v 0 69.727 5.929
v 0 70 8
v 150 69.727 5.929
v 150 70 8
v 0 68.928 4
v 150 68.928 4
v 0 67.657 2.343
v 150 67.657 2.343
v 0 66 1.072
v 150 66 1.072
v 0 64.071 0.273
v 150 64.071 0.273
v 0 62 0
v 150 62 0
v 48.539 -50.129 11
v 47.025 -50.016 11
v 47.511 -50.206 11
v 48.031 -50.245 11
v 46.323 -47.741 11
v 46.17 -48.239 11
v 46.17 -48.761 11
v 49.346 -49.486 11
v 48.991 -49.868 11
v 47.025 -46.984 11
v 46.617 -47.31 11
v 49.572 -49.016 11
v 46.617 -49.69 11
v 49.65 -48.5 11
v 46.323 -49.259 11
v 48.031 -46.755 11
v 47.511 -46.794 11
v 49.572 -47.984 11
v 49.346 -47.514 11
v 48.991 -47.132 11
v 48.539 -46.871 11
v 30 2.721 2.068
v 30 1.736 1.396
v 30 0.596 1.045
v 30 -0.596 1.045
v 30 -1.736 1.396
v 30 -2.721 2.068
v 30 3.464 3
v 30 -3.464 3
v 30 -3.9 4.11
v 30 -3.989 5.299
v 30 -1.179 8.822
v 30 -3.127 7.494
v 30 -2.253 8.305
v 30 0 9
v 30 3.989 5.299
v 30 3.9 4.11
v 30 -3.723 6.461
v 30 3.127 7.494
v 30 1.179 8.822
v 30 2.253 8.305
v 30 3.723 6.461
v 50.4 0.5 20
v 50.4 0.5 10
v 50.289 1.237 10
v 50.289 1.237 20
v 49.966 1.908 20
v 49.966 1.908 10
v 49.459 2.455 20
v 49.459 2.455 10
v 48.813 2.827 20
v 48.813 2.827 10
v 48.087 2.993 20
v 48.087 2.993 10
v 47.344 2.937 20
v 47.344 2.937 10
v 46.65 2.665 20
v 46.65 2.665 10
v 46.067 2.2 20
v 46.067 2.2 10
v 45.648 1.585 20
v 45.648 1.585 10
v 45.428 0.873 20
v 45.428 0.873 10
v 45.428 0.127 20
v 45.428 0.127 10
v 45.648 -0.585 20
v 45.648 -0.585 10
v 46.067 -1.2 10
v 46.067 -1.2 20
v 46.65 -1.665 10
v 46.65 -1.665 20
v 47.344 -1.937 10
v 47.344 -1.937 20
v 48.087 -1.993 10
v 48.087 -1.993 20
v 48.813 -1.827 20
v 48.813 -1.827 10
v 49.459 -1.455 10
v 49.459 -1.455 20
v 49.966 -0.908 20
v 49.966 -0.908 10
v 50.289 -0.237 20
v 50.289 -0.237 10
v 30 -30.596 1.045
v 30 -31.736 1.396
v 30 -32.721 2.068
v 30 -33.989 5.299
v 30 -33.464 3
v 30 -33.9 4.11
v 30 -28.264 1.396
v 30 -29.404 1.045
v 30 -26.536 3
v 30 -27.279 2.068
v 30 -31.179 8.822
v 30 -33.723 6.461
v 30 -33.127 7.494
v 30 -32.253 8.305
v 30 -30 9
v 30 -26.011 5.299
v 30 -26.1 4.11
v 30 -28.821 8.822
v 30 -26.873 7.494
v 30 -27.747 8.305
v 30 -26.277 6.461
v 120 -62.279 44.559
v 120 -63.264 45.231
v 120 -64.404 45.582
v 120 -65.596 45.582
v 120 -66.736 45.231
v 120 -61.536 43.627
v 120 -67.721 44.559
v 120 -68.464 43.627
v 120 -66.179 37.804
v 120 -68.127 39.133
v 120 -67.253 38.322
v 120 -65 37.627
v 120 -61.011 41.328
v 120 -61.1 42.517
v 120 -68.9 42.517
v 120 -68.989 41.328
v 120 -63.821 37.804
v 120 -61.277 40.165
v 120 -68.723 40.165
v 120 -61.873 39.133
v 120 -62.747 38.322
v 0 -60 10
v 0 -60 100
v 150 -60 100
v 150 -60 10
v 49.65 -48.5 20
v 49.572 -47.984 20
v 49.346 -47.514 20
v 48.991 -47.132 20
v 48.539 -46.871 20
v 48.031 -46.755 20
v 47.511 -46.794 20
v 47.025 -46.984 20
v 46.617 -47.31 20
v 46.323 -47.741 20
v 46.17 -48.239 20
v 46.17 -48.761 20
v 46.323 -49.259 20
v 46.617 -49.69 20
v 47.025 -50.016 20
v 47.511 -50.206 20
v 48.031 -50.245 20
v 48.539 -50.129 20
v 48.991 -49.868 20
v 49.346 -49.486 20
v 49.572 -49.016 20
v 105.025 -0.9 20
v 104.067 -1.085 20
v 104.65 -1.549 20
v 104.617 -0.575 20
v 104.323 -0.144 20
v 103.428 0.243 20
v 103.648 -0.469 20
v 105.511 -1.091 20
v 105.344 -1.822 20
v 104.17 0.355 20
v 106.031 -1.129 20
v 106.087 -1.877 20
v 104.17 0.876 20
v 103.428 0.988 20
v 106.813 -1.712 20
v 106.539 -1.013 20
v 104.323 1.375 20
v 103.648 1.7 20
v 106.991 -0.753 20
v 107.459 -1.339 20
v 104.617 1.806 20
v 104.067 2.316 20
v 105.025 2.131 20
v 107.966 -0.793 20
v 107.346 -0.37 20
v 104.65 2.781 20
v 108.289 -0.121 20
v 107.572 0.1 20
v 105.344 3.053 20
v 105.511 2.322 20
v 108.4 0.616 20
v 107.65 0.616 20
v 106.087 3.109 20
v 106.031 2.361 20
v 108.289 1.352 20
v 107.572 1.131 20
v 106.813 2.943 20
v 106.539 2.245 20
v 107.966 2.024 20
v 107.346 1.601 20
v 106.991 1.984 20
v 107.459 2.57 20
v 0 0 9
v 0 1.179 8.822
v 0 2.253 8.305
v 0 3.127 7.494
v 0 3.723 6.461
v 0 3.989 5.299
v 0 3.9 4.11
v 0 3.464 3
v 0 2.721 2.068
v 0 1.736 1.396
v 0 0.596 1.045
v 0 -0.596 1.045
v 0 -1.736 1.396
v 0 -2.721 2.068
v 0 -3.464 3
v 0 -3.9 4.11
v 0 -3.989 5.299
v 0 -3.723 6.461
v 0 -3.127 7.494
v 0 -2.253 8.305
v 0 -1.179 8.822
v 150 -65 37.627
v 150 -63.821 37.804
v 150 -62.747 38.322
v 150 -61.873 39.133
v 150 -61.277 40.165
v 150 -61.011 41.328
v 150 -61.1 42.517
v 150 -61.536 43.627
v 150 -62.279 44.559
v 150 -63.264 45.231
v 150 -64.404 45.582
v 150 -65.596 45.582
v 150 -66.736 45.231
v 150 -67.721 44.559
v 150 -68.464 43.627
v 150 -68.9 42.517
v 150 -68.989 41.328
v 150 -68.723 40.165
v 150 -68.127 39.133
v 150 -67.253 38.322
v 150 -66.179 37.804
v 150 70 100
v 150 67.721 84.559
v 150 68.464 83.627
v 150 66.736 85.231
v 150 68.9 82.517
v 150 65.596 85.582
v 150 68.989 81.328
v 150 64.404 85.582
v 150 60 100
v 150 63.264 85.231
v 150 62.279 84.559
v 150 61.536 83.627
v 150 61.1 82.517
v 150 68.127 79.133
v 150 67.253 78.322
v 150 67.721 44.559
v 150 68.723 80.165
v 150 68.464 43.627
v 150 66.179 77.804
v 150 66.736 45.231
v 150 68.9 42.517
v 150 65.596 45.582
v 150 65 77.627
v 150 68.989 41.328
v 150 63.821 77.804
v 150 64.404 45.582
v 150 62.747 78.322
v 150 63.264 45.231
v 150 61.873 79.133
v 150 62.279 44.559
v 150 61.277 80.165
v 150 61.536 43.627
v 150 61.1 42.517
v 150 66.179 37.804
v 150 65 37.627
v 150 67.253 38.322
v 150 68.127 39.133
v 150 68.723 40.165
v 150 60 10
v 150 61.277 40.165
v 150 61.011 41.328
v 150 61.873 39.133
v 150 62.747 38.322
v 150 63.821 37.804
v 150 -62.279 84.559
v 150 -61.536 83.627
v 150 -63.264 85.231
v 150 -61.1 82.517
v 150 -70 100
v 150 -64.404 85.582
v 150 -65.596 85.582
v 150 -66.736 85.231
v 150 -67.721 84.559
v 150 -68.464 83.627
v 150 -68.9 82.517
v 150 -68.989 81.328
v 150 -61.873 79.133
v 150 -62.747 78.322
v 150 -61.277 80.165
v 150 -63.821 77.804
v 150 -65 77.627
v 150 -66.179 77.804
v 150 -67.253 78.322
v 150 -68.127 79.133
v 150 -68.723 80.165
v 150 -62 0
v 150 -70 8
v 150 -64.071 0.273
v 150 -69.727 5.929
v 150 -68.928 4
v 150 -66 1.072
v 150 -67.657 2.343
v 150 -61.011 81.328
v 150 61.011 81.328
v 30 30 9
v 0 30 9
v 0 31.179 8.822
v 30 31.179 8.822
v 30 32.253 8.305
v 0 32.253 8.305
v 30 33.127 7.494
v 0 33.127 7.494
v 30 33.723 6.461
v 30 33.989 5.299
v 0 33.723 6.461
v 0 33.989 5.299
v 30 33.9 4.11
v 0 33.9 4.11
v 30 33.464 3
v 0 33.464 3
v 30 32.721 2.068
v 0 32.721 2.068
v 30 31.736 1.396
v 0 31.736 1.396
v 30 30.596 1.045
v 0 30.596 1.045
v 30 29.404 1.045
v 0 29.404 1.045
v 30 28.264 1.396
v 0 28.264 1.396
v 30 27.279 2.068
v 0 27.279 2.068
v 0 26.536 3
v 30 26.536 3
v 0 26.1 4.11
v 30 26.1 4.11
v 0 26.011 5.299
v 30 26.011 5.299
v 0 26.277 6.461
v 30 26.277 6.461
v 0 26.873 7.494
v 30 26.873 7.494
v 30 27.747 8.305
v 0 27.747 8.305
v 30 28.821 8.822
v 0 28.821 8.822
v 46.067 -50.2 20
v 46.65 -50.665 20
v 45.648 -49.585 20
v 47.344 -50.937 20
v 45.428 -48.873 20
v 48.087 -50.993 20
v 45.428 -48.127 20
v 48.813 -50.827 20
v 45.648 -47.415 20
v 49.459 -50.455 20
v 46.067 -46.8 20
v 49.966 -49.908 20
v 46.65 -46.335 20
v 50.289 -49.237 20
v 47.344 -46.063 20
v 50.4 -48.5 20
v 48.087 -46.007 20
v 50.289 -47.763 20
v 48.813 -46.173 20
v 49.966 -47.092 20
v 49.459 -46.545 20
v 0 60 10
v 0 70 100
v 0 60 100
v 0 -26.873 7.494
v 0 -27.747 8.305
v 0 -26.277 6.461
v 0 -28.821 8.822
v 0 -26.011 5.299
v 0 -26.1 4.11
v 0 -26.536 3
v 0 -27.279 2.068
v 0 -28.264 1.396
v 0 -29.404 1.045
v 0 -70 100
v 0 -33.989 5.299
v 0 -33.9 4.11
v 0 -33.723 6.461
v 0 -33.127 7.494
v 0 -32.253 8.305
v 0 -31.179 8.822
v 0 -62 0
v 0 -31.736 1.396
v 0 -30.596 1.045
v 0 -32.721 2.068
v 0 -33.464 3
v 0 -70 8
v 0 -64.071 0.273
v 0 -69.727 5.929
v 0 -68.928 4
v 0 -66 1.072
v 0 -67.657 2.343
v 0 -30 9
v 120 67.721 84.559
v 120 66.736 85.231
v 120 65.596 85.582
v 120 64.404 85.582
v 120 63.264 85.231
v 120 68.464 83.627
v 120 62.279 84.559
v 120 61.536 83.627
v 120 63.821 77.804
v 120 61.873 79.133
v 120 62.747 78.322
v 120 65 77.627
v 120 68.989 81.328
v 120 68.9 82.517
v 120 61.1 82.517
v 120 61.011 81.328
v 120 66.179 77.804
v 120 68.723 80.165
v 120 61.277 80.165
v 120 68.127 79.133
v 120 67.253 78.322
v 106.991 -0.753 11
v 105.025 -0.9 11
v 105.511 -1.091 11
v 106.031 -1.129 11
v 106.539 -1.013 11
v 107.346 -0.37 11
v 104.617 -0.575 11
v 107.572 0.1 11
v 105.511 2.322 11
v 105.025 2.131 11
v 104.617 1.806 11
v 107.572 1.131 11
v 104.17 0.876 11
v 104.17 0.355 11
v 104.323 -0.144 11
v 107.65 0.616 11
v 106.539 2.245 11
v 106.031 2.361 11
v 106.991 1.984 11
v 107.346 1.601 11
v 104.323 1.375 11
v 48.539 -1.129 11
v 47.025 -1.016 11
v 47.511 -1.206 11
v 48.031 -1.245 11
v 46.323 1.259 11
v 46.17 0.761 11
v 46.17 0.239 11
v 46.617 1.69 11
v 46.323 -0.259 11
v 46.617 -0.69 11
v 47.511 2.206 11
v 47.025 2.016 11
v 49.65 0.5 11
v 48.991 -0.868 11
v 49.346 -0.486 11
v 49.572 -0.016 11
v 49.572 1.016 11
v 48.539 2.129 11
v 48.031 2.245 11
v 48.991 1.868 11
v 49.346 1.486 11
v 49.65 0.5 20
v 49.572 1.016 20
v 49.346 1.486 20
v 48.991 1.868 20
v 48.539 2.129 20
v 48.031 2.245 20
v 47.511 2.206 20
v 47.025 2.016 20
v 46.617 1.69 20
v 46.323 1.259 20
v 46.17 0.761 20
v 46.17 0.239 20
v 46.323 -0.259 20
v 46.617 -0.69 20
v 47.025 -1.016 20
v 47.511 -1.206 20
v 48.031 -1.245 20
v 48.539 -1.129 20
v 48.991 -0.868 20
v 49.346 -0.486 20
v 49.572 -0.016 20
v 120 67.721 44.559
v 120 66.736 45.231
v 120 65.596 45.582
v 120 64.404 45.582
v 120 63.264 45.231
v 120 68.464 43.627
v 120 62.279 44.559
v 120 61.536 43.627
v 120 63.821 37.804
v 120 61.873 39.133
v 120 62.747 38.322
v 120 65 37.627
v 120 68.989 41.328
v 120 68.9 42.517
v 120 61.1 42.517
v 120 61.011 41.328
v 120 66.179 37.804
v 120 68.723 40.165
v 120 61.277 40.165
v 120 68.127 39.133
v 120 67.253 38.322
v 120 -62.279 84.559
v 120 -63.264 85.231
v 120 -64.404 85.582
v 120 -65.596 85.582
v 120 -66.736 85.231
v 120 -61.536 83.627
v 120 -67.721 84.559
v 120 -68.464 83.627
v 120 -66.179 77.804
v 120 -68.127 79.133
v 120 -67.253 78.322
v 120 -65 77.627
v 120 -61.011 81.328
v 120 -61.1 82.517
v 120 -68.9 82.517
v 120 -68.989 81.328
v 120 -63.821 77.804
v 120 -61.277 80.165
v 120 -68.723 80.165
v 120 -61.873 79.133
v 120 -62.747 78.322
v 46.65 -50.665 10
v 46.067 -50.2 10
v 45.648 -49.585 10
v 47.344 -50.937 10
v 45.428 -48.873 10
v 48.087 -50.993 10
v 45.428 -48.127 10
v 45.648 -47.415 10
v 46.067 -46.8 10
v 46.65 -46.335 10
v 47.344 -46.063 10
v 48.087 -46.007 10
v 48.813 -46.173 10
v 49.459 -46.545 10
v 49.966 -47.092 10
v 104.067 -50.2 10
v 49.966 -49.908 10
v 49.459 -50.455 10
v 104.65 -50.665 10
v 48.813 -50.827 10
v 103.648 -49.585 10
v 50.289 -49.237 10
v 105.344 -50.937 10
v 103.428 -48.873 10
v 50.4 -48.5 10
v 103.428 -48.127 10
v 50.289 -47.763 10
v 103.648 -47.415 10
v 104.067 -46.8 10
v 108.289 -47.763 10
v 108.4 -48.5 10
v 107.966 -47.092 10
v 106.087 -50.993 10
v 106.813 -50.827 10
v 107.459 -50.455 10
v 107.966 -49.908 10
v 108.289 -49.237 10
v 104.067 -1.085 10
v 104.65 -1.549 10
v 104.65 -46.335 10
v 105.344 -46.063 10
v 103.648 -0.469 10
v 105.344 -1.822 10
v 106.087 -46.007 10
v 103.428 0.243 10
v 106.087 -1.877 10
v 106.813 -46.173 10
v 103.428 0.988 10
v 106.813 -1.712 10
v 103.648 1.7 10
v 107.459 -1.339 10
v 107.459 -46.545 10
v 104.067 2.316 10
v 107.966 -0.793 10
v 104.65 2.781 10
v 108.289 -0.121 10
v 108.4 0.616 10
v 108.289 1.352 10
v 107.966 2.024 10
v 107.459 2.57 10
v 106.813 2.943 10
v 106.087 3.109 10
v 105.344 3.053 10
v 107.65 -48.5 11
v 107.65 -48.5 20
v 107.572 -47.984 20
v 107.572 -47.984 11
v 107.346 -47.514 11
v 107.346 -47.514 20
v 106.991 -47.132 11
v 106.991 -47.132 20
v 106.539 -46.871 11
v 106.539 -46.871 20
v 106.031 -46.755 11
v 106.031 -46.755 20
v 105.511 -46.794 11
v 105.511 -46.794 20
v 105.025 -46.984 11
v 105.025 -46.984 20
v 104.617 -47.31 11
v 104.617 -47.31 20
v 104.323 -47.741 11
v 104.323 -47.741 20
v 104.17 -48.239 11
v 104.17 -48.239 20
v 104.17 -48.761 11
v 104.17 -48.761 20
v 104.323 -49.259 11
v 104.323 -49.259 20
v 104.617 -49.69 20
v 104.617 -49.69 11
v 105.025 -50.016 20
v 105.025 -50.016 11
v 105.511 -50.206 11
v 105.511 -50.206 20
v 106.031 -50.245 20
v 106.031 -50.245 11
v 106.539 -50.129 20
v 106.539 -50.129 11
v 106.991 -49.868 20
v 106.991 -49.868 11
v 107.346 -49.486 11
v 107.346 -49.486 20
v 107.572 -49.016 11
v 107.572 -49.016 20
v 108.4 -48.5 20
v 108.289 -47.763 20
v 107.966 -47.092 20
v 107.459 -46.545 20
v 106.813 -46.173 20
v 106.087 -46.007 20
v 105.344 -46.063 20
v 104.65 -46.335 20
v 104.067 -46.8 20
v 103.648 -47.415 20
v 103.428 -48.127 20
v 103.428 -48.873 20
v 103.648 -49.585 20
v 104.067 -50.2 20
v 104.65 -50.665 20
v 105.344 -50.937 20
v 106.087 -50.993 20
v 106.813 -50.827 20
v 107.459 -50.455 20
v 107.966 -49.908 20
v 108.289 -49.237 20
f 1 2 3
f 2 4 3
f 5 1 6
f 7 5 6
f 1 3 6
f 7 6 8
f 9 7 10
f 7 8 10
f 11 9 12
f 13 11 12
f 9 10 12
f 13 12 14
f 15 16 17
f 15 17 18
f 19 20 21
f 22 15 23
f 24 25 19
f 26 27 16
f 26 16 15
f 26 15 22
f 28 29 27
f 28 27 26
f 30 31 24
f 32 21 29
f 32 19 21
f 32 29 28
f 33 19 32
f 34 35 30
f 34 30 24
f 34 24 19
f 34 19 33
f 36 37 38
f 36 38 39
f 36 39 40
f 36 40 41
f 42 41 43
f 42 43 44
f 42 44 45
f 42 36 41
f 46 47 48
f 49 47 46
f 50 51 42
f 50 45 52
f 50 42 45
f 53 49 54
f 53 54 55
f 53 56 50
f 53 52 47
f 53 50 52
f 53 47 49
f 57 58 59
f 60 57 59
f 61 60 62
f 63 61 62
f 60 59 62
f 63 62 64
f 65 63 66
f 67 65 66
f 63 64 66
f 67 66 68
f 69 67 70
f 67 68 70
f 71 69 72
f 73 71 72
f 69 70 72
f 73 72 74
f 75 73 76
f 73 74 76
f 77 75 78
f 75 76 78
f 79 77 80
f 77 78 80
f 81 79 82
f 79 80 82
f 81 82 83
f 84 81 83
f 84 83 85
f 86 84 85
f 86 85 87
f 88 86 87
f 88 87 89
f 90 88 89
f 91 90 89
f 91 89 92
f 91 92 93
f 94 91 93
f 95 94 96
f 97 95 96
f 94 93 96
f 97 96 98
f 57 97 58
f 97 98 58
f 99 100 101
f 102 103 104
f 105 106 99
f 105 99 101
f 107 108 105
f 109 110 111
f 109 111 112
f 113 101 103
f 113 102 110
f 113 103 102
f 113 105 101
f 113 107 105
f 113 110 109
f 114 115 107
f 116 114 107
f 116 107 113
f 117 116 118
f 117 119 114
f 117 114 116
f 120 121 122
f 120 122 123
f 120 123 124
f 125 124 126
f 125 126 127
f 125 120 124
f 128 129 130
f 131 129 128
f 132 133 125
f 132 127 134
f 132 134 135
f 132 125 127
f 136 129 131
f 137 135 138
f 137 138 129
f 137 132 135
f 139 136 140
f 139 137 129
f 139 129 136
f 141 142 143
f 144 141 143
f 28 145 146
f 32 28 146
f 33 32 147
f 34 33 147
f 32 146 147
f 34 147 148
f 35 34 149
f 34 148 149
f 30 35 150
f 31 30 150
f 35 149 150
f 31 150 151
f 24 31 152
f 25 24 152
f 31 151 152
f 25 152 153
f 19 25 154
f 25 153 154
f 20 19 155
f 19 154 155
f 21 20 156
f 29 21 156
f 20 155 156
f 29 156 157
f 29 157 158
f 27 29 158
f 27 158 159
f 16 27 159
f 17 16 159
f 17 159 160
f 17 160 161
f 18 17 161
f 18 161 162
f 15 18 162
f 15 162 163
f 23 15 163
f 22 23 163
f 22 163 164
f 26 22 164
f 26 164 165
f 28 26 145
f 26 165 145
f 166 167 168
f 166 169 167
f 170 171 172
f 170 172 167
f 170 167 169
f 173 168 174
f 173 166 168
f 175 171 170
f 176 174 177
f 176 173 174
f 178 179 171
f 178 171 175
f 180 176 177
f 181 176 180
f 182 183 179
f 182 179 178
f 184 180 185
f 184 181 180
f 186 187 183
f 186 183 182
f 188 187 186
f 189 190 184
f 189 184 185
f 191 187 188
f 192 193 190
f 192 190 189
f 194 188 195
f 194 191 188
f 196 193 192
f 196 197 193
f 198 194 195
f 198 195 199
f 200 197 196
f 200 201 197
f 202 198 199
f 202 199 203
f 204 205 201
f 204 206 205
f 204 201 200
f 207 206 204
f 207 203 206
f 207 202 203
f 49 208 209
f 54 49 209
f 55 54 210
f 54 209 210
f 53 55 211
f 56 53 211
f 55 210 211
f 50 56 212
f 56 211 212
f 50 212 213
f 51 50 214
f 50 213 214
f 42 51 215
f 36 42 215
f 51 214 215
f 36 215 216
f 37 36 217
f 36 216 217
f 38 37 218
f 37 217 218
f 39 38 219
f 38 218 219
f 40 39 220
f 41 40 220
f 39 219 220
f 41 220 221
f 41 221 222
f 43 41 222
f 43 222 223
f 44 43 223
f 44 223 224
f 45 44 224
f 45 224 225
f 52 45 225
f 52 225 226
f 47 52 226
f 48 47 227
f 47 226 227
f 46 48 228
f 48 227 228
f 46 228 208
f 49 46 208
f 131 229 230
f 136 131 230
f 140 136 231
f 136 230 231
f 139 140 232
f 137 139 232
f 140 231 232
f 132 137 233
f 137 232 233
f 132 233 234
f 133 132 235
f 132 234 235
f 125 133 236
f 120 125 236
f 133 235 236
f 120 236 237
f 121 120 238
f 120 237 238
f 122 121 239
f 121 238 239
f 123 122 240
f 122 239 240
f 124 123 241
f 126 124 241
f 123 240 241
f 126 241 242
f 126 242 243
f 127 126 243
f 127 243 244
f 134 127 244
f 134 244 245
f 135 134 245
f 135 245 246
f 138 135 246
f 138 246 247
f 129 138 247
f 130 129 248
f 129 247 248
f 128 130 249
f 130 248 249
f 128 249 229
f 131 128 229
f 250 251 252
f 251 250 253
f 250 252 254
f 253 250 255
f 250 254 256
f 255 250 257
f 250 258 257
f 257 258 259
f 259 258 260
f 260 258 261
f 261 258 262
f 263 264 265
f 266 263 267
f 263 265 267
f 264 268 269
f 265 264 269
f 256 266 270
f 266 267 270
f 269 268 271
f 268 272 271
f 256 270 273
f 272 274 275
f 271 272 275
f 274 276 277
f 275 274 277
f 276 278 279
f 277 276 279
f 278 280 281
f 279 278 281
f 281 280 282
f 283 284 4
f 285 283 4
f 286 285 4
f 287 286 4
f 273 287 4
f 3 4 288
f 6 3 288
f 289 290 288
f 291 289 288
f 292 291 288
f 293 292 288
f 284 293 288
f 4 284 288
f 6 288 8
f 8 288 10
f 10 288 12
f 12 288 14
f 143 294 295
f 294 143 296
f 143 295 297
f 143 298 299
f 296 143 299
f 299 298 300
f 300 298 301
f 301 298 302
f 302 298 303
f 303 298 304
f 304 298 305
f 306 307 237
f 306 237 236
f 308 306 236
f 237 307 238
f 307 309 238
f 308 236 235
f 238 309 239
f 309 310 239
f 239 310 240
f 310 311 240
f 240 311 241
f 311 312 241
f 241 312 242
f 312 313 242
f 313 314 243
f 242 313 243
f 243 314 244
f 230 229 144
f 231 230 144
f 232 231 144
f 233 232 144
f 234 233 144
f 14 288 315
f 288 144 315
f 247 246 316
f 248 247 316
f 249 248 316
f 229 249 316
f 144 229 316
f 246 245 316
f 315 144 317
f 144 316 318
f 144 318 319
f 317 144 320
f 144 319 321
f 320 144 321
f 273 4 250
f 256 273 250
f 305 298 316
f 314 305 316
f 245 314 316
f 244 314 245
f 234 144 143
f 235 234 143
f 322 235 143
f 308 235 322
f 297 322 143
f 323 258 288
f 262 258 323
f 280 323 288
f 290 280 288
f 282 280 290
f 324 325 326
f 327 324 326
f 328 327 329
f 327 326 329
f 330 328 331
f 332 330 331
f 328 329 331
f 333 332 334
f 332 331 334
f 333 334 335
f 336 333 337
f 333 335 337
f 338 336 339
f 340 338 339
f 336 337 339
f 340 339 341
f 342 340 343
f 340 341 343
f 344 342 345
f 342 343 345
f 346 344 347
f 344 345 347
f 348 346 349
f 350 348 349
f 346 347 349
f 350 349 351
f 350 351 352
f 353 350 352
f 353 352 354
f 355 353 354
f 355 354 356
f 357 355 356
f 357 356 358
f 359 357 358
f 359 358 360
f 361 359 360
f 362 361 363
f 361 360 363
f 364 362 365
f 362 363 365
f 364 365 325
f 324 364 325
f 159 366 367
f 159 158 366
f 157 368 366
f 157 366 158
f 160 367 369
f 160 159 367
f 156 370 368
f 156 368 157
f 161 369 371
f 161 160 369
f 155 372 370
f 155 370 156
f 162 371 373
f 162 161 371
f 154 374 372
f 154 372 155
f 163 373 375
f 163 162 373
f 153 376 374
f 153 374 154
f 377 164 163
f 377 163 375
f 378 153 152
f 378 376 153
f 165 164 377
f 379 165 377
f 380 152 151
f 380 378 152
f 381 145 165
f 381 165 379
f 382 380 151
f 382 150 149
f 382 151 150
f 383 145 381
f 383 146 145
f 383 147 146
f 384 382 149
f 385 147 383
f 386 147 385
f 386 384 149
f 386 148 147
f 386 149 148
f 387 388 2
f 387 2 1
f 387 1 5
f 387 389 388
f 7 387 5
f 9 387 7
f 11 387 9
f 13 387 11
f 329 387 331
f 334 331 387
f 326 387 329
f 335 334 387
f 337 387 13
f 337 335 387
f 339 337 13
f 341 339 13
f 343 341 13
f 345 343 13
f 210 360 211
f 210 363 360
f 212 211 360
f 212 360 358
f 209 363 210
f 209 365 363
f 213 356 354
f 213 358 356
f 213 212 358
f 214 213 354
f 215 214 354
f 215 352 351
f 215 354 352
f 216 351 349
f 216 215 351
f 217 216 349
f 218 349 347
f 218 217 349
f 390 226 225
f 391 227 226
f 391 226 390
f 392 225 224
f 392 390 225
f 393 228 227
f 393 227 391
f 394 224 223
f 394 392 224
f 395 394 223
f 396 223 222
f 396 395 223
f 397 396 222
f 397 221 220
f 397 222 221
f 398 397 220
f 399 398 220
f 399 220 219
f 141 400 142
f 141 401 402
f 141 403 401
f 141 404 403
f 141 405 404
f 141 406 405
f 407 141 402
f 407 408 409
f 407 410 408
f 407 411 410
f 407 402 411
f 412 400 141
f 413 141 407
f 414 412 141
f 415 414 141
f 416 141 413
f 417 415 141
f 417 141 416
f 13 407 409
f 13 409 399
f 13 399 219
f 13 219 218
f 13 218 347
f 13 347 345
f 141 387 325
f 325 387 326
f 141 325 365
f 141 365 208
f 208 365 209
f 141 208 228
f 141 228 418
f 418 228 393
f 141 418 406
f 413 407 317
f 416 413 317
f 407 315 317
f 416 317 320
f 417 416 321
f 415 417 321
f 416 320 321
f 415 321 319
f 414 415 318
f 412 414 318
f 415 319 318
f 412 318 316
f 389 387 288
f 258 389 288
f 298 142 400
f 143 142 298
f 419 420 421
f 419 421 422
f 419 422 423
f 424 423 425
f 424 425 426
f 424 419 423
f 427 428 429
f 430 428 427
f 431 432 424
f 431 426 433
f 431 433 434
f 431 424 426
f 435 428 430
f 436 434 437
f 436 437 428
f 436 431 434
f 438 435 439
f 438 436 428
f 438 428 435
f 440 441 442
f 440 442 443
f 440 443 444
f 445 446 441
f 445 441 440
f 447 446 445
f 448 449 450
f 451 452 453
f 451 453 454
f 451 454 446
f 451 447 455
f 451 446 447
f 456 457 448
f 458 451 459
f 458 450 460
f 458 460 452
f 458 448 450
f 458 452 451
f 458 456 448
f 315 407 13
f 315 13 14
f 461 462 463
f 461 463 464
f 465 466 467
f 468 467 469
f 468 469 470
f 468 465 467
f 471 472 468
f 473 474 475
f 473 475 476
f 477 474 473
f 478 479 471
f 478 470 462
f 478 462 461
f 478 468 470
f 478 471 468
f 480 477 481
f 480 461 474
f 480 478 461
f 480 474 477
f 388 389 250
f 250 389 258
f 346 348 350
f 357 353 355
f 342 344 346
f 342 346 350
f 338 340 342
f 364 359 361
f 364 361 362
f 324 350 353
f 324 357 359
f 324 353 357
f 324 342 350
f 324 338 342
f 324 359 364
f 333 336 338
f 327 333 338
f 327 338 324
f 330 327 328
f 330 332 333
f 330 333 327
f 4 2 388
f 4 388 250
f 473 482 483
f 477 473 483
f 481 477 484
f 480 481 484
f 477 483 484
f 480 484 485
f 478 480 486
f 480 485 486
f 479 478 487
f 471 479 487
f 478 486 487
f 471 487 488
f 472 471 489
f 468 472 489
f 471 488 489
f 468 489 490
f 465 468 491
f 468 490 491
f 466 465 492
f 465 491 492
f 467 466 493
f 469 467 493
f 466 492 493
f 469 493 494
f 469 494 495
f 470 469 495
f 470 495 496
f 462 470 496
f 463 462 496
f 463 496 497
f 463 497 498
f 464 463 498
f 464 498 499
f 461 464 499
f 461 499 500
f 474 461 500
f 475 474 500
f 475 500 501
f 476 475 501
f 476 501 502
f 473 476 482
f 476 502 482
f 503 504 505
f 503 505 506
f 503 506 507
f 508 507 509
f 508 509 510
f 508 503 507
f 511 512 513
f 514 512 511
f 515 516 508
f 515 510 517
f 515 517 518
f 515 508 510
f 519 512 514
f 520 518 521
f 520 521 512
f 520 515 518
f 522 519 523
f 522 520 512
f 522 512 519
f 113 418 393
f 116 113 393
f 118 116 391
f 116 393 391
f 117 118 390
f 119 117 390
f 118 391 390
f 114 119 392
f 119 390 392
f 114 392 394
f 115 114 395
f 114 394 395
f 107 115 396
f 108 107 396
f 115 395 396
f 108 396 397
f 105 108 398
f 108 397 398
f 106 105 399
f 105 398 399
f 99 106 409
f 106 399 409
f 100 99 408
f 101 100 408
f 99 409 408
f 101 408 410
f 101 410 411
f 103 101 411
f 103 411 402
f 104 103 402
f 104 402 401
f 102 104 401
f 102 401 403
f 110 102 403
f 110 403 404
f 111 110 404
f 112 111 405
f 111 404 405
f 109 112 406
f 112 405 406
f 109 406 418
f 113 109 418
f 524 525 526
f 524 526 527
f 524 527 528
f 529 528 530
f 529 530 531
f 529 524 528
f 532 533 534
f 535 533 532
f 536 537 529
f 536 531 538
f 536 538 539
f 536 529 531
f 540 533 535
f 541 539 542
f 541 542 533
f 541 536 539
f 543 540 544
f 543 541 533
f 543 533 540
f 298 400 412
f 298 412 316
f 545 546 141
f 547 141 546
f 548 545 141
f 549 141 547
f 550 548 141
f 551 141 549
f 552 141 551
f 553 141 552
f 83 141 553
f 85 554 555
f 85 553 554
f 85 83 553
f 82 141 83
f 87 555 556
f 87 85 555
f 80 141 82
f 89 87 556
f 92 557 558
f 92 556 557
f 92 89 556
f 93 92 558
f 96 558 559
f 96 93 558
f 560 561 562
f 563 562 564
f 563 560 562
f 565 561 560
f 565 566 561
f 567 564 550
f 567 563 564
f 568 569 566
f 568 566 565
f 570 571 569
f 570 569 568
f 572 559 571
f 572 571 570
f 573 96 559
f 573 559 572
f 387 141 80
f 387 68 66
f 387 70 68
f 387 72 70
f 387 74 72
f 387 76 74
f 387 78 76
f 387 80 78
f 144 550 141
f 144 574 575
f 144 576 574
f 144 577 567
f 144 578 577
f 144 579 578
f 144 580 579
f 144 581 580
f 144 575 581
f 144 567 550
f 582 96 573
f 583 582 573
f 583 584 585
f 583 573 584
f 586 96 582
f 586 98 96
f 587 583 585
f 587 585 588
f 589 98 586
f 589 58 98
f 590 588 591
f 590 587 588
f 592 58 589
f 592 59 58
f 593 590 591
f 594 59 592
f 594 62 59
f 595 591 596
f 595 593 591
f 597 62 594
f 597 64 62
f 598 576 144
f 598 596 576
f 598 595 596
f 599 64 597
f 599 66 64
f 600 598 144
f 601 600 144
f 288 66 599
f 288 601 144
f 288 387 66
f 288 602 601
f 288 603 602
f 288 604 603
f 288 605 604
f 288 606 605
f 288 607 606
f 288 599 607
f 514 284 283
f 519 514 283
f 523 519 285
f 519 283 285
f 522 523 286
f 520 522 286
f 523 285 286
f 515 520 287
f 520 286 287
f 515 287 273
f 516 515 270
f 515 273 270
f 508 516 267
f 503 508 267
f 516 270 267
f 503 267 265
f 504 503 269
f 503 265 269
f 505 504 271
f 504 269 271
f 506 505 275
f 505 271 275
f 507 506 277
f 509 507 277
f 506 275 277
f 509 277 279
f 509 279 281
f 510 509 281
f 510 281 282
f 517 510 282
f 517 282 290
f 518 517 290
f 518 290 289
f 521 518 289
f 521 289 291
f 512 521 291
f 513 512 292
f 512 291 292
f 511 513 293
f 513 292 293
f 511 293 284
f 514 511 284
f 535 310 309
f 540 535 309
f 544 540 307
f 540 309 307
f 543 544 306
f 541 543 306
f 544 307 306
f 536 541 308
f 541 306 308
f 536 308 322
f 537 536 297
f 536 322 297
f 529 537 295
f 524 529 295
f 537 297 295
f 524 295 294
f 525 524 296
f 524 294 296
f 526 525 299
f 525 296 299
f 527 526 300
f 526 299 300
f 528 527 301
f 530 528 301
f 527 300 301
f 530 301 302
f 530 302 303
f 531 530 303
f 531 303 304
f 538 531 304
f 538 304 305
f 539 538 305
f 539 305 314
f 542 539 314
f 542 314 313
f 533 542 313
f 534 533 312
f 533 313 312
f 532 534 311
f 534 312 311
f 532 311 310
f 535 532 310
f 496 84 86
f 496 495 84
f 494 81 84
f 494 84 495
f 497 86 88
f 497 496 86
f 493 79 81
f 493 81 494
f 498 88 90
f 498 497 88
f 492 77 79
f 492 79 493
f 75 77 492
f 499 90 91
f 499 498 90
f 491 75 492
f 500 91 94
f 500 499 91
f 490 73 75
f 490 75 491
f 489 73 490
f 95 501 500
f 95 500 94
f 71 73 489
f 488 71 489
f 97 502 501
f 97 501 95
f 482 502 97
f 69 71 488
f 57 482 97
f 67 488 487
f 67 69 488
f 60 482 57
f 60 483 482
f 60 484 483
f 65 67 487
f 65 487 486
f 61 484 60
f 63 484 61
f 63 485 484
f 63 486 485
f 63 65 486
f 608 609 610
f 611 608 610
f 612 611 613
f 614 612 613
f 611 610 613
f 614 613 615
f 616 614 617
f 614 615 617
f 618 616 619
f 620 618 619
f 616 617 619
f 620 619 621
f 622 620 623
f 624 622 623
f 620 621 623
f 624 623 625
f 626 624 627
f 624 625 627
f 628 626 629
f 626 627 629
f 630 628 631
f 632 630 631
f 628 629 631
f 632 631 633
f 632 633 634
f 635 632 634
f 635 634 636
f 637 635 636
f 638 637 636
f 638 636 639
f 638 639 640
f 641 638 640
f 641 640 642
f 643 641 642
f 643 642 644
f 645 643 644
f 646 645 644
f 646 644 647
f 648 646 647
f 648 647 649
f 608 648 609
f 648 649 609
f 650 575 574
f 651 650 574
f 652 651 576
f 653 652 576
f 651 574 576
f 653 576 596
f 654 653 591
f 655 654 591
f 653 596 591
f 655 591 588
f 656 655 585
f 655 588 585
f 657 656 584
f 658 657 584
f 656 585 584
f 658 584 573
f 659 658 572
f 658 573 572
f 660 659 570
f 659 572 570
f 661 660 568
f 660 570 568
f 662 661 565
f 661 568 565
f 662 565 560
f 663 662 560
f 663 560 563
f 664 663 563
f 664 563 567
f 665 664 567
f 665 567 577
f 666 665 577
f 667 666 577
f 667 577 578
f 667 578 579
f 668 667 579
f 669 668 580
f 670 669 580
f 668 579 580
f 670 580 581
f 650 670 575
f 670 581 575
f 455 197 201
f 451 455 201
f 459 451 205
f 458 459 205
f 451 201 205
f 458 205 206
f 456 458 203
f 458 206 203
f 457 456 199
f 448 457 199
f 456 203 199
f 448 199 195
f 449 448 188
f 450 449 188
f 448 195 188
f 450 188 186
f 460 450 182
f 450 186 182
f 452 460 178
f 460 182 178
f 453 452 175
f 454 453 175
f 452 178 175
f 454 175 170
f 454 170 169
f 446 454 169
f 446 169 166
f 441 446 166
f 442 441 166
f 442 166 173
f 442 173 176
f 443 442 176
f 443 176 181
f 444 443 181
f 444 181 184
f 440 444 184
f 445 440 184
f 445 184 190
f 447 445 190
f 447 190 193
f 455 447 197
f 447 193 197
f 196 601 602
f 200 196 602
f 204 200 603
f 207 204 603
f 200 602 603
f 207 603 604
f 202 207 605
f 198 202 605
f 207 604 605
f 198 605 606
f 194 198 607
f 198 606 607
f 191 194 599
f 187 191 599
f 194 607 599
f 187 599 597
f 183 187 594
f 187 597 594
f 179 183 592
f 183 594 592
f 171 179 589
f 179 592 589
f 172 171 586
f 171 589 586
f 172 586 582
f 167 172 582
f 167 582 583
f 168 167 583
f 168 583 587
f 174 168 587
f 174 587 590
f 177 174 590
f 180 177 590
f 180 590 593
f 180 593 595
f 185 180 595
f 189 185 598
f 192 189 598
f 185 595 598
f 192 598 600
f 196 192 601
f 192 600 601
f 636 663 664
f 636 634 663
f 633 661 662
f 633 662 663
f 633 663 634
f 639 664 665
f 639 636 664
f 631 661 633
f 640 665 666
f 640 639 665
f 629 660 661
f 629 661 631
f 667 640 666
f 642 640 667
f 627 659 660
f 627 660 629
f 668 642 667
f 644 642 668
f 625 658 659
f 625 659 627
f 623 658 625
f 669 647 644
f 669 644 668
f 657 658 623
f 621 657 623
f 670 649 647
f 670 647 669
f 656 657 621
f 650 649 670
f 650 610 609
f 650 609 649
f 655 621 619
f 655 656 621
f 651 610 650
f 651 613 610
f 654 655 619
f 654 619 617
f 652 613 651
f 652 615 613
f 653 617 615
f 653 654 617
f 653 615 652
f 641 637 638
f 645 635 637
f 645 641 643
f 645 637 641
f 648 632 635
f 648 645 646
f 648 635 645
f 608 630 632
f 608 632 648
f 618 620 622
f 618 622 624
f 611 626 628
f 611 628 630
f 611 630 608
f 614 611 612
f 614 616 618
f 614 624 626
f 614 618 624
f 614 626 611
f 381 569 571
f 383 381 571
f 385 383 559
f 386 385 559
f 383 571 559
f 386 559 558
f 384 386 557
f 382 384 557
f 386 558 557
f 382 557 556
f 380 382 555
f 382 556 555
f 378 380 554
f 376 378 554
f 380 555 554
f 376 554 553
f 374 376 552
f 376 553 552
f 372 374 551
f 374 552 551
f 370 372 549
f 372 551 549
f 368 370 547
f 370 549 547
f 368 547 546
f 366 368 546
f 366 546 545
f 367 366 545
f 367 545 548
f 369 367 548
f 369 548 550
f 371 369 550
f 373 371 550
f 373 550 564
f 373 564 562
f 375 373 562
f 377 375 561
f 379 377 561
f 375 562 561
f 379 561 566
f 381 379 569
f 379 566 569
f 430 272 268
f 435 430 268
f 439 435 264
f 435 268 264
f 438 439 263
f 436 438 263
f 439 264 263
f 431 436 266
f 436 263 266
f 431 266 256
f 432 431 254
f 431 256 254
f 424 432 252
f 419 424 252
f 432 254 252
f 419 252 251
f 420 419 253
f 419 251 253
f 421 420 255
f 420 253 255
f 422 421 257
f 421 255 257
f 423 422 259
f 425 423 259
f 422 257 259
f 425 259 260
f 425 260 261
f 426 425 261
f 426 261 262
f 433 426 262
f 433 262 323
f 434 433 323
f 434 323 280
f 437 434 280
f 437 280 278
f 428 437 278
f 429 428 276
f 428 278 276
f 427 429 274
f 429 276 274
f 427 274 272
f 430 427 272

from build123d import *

# Parameters (mm, degrees)
SKETCH1_W               = 150
SKETCH1_H               = 120
BOSS_EXTRUDE1_DEPTH     = 10
SKETCH2_R               = 4
CUT_EXTRUDE1_DEPTH      = 30
CROQUIS4_R              = 2.5
SALIENTE_EXTRUIR2_DEPTH = 10
CROQUIS5_R              = 1.75
CORTAR_EXTRUIR1_DEPTH   = 9
CROQUIS6_W              = 150
CROQUIS6_H              = 100
SALIENTE_EXTRUIR3_DEPTH = 10
CROQUIS9_W              = 150
CROQUIS9_H              = 100
SALIENTE_EXTRUIR4_DEPTH = 10
CROQUIS10_R             = 4
CORTAR_EXTRUIR2_DEPTH   = 30
FILLET1_R               = 8


with BuildPart() as part:
    # Sketch1 → Boss-Extrude1 (new body)
    with BuildSketch(Plane.XY):
        with Locations((75, 0)):
            Rectangle(SKETCH1_W, SKETCH1_H)
    extrude(amount=BOSS_EXTRUDE1_DEPTH)

    # Sketch2 → Cut-Extrude1 (cut)
    with BuildSketch(Plane.ZY):
        with Locations((5, 0)):
            Circle(SKETCH2_R)
        with Locations((5, 30)):
            Circle(SKETCH2_R)
        with Locations((5, -30)):
            Circle(SKETCH2_R)
    extrude(amount=-CUT_EXTRUDE1_DEPTH, mode=Mode.SUBTRACT)

    # Croquis4 → Saliente-Extruir2 (add)
    with BuildSketch(Plane.XY.offset(10)):
        with Locations((47.900115216, 0.5)):
            Circle(CROQUIS4_R)
        with Locations((105.9, 0.615607451)):
            Circle(CROQUIS4_R)
        with Locations((105.9, -48.5)):
            Circle(CROQUIS4_R)
        with Locations((47.900115216, -48.5)):
            Circle(CROQUIS4_R)
    extrude(amount=SALIENTE_EXTRUIR2_DEPTH)

    # Croquis5 → Cortar-Extruir1 (cut)
    with BuildSketch(Plane.XY.offset(20)):
        with Locations((47.900115216, 0.5)):
            Circle(CROQUIS5_R)
        with Locations((47.900115216, -48.5)):
            Circle(CROQUIS5_R)
        with Locations((105.9, -48.5)):
            Circle(CROQUIS5_R)
        with Locations((105.9, 0.615607451)):
            Circle(CROQUIS5_R)
    extrude(amount=-CORTAR_EXTRUIR1_DEPTH, mode=Mode.SUBTRACT)

    # Croquis6 → Saliente-Extruir3 (add)
    with BuildSketch(Plane.XZ.offset(60)):
        with Locations((75, 50)):
            Rectangle(CROQUIS6_W, CROQUIS6_H)
    extrude(amount=SALIENTE_EXTRUIR3_DEPTH)

    # Croquis9 → Saliente-Extruir4 (add)
    with BuildSketch(Plane(origin=(0, 60, 0), x_dir=(1, 0, 0), z_dir=(0, 1, 0))):
        with Locations((75, -50)):
            Rectangle(CROQUIS9_W, CROQUIS9_H)
    extrude(amount=SALIENTE_EXTRUIR4_DEPTH)

    # Croquis10 → Cortar-Extruir2 (cut)
    with BuildSketch(Plane(origin=(150, 0, 0), x_dir=(0, 0, -1), z_dir=(1, 0, 0))):
        with Locations((-81.62673219, 65)):
            Circle(CROQUIS10_R)
        with Locations((-41.62673219, 65)):
            Circle(CROQUIS10_R)
        with Locations((-81.62673219, -65)):
            Circle(CROQUIS10_R)
        with Locations((-41.62673219, -65)):
            Circle(CROQUIS10_R)
    extrude(amount=-CORTAR_EXTRUIR2_DEPTH, mode=Mode.SUBTRACT)

    # Fillet1
    fillet1_edges = [part.edges().sort_by_distance(p)[0] for p in [
        (75, -70, 0),
        (75, 70, 0),
    ]]
    fillet(fillet1_edges, radius=FILLET1_R)


solid = part.part
